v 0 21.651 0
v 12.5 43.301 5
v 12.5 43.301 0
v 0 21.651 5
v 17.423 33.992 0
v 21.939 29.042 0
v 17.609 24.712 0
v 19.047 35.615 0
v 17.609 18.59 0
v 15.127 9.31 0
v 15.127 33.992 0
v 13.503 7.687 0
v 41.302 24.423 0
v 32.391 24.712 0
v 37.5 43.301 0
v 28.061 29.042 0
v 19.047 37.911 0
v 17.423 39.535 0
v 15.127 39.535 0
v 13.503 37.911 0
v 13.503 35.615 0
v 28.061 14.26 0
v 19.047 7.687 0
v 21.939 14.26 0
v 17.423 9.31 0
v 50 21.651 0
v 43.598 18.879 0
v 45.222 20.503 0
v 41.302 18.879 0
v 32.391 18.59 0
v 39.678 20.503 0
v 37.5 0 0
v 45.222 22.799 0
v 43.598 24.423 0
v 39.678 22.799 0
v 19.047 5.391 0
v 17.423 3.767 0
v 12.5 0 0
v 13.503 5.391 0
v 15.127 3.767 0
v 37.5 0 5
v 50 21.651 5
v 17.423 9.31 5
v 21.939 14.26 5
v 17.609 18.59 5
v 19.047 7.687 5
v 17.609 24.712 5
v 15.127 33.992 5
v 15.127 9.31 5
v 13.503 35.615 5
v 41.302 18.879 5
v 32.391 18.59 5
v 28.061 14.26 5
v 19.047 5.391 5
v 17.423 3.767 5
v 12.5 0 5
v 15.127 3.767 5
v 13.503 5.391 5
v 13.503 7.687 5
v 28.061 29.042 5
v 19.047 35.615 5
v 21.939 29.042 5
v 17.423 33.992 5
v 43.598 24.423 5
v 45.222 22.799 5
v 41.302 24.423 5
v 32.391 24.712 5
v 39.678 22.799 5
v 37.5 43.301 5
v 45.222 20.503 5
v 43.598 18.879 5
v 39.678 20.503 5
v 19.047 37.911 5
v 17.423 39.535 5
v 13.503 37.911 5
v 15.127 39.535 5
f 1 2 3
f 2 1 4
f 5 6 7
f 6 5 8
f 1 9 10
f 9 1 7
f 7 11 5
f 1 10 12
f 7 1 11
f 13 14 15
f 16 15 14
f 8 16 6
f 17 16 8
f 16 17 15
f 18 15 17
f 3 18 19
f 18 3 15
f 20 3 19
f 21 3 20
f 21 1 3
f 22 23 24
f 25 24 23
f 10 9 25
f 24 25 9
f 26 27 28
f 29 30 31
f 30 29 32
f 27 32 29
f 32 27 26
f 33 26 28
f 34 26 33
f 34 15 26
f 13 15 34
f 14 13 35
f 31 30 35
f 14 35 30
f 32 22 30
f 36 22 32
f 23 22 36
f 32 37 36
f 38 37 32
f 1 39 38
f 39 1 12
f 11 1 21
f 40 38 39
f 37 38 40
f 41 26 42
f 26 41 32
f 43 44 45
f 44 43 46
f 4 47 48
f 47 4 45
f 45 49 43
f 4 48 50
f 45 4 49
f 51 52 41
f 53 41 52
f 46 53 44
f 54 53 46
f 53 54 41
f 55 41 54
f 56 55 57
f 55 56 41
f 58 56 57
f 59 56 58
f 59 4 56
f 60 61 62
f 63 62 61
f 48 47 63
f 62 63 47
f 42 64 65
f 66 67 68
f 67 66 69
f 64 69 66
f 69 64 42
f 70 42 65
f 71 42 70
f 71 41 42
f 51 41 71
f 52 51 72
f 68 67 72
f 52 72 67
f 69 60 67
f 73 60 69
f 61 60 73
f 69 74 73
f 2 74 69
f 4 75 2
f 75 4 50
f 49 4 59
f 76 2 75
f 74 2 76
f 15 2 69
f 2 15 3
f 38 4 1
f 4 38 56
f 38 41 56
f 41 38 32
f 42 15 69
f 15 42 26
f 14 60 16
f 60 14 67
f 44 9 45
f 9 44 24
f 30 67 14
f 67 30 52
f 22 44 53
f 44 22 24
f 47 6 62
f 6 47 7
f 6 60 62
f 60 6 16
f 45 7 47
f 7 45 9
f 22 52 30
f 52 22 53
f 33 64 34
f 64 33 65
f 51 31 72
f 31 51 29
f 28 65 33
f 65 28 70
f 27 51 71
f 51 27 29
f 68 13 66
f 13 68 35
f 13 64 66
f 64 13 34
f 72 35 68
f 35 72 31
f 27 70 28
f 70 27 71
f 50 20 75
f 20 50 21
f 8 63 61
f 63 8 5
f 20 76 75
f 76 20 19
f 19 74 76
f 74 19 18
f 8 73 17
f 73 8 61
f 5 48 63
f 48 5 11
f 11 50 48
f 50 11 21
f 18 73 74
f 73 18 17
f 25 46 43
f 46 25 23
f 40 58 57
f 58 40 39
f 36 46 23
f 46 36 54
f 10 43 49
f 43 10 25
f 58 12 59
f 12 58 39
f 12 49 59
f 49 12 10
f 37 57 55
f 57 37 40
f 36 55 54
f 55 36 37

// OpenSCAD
$fn = 32;

// ----------------------------------------------------------------------
// Polygon plate: 6-gon R25, 3 bolt windows
// ----------------------------------------------------------------------

// --- parameters (mm) ---
sides = 6;                // number of polygon sides
plate_r = 25;             // circumscribed radius of the polygon
bore_r = 8;               // centre bore radius
bolts = 3;                // number of bolt windows
ring_r = 17.45;           // bolt-circle radius
bolt_r = 3;               // bolt window radius
plate_t = 5;              // plate thickness, Z (extrusion height)
fit_tol = 0.02;           // declared fit tolerance (prompt contract)
free_tol = 0.2;           // declared free tolerance (prompt contract)

plate_d = 2 * plate_r;  // circumscribed diameter
bore_d = 2 * bore_r;  // centre bore diameter
bolt_d = 2 * bolt_r;  // bolt window diameter
ring_d = 2 * ring_r;  // bolt-circle diameter

profile = [[50, 21.651], [37.5, 43.301], [12.5, 43.301], [0, 21.651], [12.5, 0], [37.5, 0]];  // primary outline, 6 points, counter clockwise
void_1 = [[32.391, 24.712], [28.061, 29.042], [21.939, 29.042], [17.609, 24.712], [17.609, 18.59], [21.939, 14.26], [28.061, 14.26], [32.391, 18.59]];  // centre bore, 8 points
void_2 = [[45.222, 22.799], [43.598, 24.423], [41.302, 24.423], [39.678, 22.799], [39.678, 20.503], [41.302, 18.879], [43.598, 18.879], [45.222, 20.503]];  // bolt window 1, 8 points
void_3 = [[19.047, 37.911], [17.423, 39.535], [15.127, 39.535], [13.503, 37.911], [13.503, 35.615], [15.127, 33.992], [17.423, 33.992], [19.047, 35.615]];  // bolt window 2, 8 points
void_4 = [[19.047, 7.687], [17.423, 9.31], [15.127, 9.31], [13.503, 7.687], [13.503, 5.391], [15.127, 3.767], [17.423, 3.767], [19.047, 5.391]];  // bolt window 3, 8 points

// --- the one profile operation ---
difference() {
  linear_extrude(height = plate_t) polygon(points = profile);
  translate([0, 0, -1])
    linear_extrude(height = plate_t + 2) polygon(points = void_1);
  translate([0, 0, -1])
    linear_extrude(height = plate_t + 2) polygon(points = void_2);
  translate([0, 0, -1])
    linear_extrude(height = plate_t + 2) polygon(points = void_3);
  translate([0, 0, -1])
    linear_extrude(height = plate_t + 2) polygon(points = void_4);
}
